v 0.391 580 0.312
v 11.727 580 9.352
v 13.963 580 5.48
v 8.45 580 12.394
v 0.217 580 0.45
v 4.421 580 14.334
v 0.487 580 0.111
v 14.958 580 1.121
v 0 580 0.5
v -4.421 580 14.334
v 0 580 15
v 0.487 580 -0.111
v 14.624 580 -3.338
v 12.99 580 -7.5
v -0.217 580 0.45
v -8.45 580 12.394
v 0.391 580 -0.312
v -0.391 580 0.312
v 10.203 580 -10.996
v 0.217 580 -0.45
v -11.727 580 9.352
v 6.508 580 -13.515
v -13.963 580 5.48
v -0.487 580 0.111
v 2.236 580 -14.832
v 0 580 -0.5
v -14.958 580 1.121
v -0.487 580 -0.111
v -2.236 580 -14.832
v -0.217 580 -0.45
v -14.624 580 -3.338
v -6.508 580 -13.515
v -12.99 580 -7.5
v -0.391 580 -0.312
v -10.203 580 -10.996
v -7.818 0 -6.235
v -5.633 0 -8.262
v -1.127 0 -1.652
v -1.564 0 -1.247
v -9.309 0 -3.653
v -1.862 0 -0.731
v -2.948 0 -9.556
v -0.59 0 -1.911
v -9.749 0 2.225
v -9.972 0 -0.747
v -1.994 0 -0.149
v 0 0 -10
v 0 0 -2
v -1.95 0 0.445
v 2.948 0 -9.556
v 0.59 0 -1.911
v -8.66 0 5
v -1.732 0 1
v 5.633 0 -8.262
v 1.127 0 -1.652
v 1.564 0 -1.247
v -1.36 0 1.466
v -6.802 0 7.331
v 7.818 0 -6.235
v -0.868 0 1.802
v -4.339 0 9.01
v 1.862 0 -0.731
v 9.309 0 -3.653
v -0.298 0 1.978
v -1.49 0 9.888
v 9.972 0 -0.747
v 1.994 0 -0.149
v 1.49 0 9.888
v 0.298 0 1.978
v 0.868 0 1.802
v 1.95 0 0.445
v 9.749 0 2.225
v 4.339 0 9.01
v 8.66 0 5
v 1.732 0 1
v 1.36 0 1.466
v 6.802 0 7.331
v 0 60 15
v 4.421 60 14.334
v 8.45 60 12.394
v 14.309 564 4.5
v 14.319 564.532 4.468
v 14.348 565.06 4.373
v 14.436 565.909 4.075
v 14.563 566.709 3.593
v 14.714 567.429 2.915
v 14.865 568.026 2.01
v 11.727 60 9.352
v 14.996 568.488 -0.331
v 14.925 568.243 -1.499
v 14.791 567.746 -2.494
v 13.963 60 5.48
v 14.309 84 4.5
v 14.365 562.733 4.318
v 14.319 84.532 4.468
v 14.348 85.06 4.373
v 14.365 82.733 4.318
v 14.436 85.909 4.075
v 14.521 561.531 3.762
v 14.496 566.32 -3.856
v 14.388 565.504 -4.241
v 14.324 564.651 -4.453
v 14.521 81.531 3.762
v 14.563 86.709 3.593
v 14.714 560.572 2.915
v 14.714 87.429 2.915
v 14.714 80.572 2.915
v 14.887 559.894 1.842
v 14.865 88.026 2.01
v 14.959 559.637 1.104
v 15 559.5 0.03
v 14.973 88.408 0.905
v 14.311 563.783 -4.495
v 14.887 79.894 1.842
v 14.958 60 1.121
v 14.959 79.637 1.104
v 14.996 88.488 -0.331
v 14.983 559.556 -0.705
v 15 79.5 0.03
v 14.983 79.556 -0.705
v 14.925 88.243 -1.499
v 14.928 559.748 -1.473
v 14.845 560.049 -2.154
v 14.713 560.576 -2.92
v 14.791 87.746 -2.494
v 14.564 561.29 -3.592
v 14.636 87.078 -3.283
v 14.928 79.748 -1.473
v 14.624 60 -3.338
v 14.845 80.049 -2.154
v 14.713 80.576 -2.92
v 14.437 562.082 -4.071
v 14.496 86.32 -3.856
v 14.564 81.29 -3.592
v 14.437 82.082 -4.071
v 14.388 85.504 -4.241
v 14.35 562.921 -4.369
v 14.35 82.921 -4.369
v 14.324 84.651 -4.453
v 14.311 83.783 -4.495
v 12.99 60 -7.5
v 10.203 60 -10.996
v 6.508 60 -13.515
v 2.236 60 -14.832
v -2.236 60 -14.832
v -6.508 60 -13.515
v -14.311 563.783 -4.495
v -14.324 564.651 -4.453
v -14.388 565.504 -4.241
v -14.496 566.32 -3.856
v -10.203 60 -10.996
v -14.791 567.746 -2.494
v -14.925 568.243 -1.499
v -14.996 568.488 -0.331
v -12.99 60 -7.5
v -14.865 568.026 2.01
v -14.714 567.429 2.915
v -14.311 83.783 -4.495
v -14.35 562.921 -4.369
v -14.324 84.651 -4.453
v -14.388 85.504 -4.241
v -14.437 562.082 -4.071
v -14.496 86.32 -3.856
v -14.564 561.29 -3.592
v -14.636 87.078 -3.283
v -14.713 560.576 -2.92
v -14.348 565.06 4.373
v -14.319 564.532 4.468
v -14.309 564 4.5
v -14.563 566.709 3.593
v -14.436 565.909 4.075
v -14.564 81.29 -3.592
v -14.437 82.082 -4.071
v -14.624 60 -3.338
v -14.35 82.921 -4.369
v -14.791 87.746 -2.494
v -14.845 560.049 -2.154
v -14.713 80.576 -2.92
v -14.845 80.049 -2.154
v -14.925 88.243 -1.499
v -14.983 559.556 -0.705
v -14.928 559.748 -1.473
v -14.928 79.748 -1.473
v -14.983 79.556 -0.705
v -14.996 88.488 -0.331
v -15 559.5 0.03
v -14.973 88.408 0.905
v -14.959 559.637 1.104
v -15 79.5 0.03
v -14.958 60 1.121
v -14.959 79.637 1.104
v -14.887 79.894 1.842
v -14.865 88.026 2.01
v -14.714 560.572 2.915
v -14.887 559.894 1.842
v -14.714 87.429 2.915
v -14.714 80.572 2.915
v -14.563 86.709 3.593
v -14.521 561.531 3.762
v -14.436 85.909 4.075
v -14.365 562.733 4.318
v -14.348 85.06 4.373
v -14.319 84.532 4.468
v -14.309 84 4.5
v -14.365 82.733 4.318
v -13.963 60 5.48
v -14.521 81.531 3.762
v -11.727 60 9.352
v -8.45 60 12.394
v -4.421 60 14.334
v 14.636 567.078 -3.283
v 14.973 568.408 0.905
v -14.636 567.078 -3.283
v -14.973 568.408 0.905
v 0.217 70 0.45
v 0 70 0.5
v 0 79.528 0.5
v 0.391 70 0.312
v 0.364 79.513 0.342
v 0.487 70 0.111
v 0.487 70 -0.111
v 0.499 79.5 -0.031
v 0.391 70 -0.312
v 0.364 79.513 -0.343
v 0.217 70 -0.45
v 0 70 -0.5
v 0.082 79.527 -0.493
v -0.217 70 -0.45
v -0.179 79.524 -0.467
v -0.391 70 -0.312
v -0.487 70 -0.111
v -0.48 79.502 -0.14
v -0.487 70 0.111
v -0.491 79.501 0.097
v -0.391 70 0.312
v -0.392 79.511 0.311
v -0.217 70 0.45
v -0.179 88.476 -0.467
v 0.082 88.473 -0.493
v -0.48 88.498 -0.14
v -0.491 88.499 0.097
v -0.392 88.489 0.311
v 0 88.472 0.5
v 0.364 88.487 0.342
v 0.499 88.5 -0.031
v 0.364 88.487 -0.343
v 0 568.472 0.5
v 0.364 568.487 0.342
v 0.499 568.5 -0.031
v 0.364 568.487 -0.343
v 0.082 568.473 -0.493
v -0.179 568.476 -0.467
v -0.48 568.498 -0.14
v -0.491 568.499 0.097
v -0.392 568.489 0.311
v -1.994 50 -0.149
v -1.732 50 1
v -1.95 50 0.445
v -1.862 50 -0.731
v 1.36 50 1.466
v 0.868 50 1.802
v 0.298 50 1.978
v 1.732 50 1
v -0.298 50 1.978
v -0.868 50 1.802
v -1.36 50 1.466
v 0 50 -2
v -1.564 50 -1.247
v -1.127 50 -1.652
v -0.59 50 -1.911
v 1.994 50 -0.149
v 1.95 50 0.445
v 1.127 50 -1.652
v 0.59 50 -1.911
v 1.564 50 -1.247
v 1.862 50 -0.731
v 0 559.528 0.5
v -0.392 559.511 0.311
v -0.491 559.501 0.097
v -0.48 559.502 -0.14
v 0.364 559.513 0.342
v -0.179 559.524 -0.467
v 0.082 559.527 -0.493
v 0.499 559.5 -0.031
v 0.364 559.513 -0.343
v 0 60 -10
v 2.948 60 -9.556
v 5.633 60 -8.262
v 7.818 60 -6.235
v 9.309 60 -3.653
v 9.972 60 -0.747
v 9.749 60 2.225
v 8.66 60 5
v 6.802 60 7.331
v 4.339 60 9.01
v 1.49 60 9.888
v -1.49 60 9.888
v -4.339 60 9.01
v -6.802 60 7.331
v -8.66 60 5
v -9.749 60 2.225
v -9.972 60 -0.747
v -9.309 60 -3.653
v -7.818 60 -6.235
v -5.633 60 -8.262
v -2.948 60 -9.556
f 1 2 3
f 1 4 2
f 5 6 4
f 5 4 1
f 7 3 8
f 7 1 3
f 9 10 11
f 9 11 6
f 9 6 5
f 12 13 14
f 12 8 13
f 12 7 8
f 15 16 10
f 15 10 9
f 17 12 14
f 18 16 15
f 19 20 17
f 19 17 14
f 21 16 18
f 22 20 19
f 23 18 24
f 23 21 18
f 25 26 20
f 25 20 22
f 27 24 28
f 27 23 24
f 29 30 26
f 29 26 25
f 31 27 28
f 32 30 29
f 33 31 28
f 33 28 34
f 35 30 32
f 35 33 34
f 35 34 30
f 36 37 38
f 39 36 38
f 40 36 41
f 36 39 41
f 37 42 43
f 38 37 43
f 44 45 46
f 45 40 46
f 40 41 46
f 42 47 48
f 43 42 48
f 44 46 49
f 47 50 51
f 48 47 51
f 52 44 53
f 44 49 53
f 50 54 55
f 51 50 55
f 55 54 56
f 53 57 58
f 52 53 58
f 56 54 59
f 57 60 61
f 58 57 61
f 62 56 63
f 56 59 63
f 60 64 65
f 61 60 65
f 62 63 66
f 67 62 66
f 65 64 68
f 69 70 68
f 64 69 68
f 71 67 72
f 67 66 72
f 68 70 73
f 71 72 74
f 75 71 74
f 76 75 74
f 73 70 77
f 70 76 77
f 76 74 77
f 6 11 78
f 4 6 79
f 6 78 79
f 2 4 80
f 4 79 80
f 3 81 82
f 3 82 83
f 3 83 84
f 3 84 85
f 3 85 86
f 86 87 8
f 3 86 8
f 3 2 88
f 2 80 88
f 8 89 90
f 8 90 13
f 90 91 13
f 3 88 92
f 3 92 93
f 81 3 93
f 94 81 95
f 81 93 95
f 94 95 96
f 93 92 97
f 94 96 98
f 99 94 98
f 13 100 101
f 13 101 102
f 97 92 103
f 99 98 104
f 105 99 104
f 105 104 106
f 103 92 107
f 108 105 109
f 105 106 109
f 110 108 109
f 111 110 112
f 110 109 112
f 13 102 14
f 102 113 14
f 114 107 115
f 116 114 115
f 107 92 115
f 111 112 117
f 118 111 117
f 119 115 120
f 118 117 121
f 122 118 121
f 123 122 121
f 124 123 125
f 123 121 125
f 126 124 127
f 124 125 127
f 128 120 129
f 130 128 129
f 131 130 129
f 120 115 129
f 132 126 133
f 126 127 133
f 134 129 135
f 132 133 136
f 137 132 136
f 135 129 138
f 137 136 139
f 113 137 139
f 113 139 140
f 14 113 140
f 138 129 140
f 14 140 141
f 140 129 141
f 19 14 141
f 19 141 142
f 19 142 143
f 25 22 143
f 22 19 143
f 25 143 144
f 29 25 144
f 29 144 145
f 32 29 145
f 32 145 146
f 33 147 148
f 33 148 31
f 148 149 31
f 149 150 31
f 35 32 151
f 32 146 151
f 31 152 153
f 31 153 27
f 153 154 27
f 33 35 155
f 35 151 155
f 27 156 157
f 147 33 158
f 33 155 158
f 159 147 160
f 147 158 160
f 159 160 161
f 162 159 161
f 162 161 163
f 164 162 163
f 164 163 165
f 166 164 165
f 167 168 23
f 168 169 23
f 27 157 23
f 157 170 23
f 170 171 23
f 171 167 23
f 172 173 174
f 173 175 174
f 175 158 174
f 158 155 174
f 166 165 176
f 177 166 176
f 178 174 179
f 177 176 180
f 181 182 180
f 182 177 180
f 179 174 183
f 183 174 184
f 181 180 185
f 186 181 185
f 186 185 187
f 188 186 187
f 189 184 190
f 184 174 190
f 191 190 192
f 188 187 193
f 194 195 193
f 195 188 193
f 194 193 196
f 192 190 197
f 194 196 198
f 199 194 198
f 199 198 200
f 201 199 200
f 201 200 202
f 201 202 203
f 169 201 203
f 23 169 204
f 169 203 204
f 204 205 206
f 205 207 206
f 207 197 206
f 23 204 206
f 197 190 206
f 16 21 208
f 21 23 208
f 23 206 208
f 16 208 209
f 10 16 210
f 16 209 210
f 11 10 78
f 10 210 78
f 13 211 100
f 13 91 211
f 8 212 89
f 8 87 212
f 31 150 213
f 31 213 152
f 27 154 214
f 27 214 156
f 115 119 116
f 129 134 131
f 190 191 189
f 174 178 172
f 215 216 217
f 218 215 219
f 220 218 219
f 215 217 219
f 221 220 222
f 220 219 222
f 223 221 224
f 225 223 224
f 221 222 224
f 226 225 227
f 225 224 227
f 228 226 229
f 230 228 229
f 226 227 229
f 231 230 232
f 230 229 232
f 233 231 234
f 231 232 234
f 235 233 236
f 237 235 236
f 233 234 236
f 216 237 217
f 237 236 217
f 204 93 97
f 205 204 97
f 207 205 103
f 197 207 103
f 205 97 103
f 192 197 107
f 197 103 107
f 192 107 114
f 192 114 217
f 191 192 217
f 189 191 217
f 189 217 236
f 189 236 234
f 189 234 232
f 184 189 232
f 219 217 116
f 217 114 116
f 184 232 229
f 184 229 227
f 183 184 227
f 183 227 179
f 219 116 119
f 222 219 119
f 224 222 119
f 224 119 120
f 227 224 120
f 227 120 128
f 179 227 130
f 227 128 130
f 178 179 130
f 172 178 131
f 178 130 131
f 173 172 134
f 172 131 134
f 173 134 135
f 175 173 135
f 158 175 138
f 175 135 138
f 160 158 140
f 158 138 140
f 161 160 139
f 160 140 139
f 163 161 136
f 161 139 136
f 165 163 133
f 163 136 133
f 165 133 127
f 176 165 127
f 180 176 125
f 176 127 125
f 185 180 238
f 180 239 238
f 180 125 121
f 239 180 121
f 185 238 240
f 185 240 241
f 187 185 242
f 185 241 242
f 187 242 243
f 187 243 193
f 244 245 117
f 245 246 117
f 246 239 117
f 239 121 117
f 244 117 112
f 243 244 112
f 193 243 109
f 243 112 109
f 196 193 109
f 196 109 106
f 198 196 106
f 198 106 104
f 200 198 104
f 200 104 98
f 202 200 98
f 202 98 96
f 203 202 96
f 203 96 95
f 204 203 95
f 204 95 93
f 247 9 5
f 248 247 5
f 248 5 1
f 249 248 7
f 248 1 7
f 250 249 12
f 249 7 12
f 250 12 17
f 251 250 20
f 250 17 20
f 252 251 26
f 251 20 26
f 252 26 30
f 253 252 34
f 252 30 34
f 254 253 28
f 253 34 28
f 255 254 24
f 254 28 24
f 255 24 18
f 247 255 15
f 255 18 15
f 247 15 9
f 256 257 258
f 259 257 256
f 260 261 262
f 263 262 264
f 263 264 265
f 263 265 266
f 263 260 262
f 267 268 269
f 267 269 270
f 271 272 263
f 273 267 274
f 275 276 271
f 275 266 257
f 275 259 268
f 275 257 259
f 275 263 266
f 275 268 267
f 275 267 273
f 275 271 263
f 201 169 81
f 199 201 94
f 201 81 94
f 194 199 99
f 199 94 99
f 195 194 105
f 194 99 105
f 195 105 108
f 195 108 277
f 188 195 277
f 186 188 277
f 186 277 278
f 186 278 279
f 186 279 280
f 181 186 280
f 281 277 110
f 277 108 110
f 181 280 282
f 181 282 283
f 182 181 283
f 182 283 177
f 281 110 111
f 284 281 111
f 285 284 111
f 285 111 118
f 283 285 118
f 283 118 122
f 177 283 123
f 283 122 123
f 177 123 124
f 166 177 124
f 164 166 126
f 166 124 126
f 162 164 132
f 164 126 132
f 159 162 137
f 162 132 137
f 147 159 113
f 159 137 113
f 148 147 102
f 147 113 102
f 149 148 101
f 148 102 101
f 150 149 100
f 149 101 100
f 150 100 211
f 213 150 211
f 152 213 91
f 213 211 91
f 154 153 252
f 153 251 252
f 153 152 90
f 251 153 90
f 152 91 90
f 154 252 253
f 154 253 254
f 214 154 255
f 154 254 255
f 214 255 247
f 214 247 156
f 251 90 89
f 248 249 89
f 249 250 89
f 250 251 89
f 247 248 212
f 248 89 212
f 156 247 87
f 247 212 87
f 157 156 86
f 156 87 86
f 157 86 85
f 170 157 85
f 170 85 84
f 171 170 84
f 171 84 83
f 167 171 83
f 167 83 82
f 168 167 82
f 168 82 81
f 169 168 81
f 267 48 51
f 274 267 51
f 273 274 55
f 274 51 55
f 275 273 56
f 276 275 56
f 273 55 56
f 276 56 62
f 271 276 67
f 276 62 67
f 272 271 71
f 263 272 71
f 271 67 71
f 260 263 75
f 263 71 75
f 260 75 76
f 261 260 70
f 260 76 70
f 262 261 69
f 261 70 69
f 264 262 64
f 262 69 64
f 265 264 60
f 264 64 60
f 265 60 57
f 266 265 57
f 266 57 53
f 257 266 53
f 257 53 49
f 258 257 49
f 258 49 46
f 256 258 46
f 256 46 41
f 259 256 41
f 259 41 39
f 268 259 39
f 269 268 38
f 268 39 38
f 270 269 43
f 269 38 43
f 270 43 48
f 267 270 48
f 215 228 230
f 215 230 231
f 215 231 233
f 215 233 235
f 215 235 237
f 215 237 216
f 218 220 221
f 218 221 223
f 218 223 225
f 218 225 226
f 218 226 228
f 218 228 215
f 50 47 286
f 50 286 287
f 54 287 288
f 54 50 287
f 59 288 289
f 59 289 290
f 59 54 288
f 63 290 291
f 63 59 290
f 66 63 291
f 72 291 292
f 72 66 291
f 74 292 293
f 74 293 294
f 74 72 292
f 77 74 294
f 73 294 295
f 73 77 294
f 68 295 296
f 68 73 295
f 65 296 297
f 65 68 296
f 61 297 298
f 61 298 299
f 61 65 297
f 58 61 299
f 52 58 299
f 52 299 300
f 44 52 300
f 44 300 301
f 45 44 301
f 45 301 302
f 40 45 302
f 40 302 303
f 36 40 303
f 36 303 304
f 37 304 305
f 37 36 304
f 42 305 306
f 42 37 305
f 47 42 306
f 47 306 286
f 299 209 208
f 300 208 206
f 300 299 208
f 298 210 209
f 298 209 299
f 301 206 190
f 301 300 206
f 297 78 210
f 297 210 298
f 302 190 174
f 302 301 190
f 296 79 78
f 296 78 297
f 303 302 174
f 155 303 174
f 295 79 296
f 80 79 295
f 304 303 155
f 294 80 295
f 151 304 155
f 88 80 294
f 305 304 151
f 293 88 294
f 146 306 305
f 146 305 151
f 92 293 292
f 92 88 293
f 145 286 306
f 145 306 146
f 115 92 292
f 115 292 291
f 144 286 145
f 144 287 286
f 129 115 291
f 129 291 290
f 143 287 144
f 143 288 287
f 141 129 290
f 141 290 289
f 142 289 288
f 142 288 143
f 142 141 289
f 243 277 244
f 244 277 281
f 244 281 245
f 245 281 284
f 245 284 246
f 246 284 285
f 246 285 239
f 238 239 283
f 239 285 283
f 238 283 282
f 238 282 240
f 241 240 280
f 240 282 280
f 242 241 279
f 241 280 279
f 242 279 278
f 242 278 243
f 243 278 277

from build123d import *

# Parameters (mm, degrees)
ESQUISSE1_R             = 15
BOSS_EXTRU_1_DEPTH      = 650
ESQUISSE2_R             = 15
ESQUISSE2_R_2           = 10
ENL_V_MAT_EXTRU_1_DEPTH = 60
ESQUISSE3_R             = 2
ENL_V_MAT_EXTRU_2_DEPTH = 50
D_GAGEMENT_M81_D        = 9
ESQUISSE6_R             = 0.5
ENL_V_MAT_EXTRU_3_DEPTH = 580
ENL_V_START             = -70
ESQUISSE7_R             = 15
ENL_V_MAT_EXTRU_4_DEPTH = 70


with BuildPart() as part:
    # Esquisse1 → Boss.-Extru.1 (new body)
    with BuildSketch(Plane(origin=(0, 0, 0), x_dir=(1, 0, 0), z_dir=(0, 1, 0))):
        with Locations(Location((0, 0, 0), (0, 0, 270))):
            Circle(ESQUISSE1_R)
    extrude(amount=BOSS_EXTRU_1_DEPTH)

    # Esquisse2 → Enlèv. mat.-Extru.1 (cut)
    with BuildSketch(Plane(origin=(0, 0, 0), x_dir=(-1, 0, 0), z_dir=(0, -1, 0))):
        with Locations(Location((0, 0, 0), (0, 0, 90))):
            Circle(ESQUISSE2_R)
        with Locations(Location((0, 0, 0), (0, 0, 90))):
            Circle(ESQUISSE2_R_2, mode=Mode.SUBTRACT)
    extrude(amount=-ENL_V_MAT_EXTRU_1_DEPTH, mode=Mode.SUBTRACT)

    # Esquisse3 → Enlèv. mat.-Extru.2 (cut)
    with BuildSketch(Plane(origin=(0, 0, 0), x_dir=(-1, 0, 0), z_dir=(0, -1, 0))):
        with Locations(Location((0, 0, 0), (0, 0, 90))):
            Circle(ESQUISSE3_R)
    extrude(amount=-ENL_V_MAT_EXTRU_2_DEPTH, mode=Mode.SUBTRACT)

    # Dégagement M81 (through all)
    with Locations(Plane(origin=(-15, 84, 0), x_dir=(0, 0, -1), z_dir=(-1, 0, 0))):
        with Locations((0, 0), (0, -480)):
            Hole(D_GAGEMENT_M81_D / 2)

    # Esquisse6 → Enlèv. mat.-Extru.3 (cut)
    with BuildSketch(Plane(origin=(0, 650, 0), x_dir=(1, 0, 0), z_dir=(0, 1, 0))):
        with Locations(Location((0, 0, 0), (0, 0, 270))):
            Circle(ESQUISSE6_R)
    extrude(amount=-ENL_V_MAT_EXTRU_3_DEPTH, mode=Mode.SUBTRACT)

    # Esquisse7 → Enlèv. mat.-Extru.4 (cut)
    with BuildSketch(Plane(origin=(0, 650, 0), x_dir=(1, 0, 0), z_dir=(0, 1, 0)).offset(ENL_V_START)):
        with Locations(Location((0, 0, 0), (0, 0, 90))):
            Circle(ESQUISSE7_R)
    extrude(amount=ENL_V_MAT_EXTRU_4_DEPTH, mode=Mode.SUBTRACT)


solid = part.part
